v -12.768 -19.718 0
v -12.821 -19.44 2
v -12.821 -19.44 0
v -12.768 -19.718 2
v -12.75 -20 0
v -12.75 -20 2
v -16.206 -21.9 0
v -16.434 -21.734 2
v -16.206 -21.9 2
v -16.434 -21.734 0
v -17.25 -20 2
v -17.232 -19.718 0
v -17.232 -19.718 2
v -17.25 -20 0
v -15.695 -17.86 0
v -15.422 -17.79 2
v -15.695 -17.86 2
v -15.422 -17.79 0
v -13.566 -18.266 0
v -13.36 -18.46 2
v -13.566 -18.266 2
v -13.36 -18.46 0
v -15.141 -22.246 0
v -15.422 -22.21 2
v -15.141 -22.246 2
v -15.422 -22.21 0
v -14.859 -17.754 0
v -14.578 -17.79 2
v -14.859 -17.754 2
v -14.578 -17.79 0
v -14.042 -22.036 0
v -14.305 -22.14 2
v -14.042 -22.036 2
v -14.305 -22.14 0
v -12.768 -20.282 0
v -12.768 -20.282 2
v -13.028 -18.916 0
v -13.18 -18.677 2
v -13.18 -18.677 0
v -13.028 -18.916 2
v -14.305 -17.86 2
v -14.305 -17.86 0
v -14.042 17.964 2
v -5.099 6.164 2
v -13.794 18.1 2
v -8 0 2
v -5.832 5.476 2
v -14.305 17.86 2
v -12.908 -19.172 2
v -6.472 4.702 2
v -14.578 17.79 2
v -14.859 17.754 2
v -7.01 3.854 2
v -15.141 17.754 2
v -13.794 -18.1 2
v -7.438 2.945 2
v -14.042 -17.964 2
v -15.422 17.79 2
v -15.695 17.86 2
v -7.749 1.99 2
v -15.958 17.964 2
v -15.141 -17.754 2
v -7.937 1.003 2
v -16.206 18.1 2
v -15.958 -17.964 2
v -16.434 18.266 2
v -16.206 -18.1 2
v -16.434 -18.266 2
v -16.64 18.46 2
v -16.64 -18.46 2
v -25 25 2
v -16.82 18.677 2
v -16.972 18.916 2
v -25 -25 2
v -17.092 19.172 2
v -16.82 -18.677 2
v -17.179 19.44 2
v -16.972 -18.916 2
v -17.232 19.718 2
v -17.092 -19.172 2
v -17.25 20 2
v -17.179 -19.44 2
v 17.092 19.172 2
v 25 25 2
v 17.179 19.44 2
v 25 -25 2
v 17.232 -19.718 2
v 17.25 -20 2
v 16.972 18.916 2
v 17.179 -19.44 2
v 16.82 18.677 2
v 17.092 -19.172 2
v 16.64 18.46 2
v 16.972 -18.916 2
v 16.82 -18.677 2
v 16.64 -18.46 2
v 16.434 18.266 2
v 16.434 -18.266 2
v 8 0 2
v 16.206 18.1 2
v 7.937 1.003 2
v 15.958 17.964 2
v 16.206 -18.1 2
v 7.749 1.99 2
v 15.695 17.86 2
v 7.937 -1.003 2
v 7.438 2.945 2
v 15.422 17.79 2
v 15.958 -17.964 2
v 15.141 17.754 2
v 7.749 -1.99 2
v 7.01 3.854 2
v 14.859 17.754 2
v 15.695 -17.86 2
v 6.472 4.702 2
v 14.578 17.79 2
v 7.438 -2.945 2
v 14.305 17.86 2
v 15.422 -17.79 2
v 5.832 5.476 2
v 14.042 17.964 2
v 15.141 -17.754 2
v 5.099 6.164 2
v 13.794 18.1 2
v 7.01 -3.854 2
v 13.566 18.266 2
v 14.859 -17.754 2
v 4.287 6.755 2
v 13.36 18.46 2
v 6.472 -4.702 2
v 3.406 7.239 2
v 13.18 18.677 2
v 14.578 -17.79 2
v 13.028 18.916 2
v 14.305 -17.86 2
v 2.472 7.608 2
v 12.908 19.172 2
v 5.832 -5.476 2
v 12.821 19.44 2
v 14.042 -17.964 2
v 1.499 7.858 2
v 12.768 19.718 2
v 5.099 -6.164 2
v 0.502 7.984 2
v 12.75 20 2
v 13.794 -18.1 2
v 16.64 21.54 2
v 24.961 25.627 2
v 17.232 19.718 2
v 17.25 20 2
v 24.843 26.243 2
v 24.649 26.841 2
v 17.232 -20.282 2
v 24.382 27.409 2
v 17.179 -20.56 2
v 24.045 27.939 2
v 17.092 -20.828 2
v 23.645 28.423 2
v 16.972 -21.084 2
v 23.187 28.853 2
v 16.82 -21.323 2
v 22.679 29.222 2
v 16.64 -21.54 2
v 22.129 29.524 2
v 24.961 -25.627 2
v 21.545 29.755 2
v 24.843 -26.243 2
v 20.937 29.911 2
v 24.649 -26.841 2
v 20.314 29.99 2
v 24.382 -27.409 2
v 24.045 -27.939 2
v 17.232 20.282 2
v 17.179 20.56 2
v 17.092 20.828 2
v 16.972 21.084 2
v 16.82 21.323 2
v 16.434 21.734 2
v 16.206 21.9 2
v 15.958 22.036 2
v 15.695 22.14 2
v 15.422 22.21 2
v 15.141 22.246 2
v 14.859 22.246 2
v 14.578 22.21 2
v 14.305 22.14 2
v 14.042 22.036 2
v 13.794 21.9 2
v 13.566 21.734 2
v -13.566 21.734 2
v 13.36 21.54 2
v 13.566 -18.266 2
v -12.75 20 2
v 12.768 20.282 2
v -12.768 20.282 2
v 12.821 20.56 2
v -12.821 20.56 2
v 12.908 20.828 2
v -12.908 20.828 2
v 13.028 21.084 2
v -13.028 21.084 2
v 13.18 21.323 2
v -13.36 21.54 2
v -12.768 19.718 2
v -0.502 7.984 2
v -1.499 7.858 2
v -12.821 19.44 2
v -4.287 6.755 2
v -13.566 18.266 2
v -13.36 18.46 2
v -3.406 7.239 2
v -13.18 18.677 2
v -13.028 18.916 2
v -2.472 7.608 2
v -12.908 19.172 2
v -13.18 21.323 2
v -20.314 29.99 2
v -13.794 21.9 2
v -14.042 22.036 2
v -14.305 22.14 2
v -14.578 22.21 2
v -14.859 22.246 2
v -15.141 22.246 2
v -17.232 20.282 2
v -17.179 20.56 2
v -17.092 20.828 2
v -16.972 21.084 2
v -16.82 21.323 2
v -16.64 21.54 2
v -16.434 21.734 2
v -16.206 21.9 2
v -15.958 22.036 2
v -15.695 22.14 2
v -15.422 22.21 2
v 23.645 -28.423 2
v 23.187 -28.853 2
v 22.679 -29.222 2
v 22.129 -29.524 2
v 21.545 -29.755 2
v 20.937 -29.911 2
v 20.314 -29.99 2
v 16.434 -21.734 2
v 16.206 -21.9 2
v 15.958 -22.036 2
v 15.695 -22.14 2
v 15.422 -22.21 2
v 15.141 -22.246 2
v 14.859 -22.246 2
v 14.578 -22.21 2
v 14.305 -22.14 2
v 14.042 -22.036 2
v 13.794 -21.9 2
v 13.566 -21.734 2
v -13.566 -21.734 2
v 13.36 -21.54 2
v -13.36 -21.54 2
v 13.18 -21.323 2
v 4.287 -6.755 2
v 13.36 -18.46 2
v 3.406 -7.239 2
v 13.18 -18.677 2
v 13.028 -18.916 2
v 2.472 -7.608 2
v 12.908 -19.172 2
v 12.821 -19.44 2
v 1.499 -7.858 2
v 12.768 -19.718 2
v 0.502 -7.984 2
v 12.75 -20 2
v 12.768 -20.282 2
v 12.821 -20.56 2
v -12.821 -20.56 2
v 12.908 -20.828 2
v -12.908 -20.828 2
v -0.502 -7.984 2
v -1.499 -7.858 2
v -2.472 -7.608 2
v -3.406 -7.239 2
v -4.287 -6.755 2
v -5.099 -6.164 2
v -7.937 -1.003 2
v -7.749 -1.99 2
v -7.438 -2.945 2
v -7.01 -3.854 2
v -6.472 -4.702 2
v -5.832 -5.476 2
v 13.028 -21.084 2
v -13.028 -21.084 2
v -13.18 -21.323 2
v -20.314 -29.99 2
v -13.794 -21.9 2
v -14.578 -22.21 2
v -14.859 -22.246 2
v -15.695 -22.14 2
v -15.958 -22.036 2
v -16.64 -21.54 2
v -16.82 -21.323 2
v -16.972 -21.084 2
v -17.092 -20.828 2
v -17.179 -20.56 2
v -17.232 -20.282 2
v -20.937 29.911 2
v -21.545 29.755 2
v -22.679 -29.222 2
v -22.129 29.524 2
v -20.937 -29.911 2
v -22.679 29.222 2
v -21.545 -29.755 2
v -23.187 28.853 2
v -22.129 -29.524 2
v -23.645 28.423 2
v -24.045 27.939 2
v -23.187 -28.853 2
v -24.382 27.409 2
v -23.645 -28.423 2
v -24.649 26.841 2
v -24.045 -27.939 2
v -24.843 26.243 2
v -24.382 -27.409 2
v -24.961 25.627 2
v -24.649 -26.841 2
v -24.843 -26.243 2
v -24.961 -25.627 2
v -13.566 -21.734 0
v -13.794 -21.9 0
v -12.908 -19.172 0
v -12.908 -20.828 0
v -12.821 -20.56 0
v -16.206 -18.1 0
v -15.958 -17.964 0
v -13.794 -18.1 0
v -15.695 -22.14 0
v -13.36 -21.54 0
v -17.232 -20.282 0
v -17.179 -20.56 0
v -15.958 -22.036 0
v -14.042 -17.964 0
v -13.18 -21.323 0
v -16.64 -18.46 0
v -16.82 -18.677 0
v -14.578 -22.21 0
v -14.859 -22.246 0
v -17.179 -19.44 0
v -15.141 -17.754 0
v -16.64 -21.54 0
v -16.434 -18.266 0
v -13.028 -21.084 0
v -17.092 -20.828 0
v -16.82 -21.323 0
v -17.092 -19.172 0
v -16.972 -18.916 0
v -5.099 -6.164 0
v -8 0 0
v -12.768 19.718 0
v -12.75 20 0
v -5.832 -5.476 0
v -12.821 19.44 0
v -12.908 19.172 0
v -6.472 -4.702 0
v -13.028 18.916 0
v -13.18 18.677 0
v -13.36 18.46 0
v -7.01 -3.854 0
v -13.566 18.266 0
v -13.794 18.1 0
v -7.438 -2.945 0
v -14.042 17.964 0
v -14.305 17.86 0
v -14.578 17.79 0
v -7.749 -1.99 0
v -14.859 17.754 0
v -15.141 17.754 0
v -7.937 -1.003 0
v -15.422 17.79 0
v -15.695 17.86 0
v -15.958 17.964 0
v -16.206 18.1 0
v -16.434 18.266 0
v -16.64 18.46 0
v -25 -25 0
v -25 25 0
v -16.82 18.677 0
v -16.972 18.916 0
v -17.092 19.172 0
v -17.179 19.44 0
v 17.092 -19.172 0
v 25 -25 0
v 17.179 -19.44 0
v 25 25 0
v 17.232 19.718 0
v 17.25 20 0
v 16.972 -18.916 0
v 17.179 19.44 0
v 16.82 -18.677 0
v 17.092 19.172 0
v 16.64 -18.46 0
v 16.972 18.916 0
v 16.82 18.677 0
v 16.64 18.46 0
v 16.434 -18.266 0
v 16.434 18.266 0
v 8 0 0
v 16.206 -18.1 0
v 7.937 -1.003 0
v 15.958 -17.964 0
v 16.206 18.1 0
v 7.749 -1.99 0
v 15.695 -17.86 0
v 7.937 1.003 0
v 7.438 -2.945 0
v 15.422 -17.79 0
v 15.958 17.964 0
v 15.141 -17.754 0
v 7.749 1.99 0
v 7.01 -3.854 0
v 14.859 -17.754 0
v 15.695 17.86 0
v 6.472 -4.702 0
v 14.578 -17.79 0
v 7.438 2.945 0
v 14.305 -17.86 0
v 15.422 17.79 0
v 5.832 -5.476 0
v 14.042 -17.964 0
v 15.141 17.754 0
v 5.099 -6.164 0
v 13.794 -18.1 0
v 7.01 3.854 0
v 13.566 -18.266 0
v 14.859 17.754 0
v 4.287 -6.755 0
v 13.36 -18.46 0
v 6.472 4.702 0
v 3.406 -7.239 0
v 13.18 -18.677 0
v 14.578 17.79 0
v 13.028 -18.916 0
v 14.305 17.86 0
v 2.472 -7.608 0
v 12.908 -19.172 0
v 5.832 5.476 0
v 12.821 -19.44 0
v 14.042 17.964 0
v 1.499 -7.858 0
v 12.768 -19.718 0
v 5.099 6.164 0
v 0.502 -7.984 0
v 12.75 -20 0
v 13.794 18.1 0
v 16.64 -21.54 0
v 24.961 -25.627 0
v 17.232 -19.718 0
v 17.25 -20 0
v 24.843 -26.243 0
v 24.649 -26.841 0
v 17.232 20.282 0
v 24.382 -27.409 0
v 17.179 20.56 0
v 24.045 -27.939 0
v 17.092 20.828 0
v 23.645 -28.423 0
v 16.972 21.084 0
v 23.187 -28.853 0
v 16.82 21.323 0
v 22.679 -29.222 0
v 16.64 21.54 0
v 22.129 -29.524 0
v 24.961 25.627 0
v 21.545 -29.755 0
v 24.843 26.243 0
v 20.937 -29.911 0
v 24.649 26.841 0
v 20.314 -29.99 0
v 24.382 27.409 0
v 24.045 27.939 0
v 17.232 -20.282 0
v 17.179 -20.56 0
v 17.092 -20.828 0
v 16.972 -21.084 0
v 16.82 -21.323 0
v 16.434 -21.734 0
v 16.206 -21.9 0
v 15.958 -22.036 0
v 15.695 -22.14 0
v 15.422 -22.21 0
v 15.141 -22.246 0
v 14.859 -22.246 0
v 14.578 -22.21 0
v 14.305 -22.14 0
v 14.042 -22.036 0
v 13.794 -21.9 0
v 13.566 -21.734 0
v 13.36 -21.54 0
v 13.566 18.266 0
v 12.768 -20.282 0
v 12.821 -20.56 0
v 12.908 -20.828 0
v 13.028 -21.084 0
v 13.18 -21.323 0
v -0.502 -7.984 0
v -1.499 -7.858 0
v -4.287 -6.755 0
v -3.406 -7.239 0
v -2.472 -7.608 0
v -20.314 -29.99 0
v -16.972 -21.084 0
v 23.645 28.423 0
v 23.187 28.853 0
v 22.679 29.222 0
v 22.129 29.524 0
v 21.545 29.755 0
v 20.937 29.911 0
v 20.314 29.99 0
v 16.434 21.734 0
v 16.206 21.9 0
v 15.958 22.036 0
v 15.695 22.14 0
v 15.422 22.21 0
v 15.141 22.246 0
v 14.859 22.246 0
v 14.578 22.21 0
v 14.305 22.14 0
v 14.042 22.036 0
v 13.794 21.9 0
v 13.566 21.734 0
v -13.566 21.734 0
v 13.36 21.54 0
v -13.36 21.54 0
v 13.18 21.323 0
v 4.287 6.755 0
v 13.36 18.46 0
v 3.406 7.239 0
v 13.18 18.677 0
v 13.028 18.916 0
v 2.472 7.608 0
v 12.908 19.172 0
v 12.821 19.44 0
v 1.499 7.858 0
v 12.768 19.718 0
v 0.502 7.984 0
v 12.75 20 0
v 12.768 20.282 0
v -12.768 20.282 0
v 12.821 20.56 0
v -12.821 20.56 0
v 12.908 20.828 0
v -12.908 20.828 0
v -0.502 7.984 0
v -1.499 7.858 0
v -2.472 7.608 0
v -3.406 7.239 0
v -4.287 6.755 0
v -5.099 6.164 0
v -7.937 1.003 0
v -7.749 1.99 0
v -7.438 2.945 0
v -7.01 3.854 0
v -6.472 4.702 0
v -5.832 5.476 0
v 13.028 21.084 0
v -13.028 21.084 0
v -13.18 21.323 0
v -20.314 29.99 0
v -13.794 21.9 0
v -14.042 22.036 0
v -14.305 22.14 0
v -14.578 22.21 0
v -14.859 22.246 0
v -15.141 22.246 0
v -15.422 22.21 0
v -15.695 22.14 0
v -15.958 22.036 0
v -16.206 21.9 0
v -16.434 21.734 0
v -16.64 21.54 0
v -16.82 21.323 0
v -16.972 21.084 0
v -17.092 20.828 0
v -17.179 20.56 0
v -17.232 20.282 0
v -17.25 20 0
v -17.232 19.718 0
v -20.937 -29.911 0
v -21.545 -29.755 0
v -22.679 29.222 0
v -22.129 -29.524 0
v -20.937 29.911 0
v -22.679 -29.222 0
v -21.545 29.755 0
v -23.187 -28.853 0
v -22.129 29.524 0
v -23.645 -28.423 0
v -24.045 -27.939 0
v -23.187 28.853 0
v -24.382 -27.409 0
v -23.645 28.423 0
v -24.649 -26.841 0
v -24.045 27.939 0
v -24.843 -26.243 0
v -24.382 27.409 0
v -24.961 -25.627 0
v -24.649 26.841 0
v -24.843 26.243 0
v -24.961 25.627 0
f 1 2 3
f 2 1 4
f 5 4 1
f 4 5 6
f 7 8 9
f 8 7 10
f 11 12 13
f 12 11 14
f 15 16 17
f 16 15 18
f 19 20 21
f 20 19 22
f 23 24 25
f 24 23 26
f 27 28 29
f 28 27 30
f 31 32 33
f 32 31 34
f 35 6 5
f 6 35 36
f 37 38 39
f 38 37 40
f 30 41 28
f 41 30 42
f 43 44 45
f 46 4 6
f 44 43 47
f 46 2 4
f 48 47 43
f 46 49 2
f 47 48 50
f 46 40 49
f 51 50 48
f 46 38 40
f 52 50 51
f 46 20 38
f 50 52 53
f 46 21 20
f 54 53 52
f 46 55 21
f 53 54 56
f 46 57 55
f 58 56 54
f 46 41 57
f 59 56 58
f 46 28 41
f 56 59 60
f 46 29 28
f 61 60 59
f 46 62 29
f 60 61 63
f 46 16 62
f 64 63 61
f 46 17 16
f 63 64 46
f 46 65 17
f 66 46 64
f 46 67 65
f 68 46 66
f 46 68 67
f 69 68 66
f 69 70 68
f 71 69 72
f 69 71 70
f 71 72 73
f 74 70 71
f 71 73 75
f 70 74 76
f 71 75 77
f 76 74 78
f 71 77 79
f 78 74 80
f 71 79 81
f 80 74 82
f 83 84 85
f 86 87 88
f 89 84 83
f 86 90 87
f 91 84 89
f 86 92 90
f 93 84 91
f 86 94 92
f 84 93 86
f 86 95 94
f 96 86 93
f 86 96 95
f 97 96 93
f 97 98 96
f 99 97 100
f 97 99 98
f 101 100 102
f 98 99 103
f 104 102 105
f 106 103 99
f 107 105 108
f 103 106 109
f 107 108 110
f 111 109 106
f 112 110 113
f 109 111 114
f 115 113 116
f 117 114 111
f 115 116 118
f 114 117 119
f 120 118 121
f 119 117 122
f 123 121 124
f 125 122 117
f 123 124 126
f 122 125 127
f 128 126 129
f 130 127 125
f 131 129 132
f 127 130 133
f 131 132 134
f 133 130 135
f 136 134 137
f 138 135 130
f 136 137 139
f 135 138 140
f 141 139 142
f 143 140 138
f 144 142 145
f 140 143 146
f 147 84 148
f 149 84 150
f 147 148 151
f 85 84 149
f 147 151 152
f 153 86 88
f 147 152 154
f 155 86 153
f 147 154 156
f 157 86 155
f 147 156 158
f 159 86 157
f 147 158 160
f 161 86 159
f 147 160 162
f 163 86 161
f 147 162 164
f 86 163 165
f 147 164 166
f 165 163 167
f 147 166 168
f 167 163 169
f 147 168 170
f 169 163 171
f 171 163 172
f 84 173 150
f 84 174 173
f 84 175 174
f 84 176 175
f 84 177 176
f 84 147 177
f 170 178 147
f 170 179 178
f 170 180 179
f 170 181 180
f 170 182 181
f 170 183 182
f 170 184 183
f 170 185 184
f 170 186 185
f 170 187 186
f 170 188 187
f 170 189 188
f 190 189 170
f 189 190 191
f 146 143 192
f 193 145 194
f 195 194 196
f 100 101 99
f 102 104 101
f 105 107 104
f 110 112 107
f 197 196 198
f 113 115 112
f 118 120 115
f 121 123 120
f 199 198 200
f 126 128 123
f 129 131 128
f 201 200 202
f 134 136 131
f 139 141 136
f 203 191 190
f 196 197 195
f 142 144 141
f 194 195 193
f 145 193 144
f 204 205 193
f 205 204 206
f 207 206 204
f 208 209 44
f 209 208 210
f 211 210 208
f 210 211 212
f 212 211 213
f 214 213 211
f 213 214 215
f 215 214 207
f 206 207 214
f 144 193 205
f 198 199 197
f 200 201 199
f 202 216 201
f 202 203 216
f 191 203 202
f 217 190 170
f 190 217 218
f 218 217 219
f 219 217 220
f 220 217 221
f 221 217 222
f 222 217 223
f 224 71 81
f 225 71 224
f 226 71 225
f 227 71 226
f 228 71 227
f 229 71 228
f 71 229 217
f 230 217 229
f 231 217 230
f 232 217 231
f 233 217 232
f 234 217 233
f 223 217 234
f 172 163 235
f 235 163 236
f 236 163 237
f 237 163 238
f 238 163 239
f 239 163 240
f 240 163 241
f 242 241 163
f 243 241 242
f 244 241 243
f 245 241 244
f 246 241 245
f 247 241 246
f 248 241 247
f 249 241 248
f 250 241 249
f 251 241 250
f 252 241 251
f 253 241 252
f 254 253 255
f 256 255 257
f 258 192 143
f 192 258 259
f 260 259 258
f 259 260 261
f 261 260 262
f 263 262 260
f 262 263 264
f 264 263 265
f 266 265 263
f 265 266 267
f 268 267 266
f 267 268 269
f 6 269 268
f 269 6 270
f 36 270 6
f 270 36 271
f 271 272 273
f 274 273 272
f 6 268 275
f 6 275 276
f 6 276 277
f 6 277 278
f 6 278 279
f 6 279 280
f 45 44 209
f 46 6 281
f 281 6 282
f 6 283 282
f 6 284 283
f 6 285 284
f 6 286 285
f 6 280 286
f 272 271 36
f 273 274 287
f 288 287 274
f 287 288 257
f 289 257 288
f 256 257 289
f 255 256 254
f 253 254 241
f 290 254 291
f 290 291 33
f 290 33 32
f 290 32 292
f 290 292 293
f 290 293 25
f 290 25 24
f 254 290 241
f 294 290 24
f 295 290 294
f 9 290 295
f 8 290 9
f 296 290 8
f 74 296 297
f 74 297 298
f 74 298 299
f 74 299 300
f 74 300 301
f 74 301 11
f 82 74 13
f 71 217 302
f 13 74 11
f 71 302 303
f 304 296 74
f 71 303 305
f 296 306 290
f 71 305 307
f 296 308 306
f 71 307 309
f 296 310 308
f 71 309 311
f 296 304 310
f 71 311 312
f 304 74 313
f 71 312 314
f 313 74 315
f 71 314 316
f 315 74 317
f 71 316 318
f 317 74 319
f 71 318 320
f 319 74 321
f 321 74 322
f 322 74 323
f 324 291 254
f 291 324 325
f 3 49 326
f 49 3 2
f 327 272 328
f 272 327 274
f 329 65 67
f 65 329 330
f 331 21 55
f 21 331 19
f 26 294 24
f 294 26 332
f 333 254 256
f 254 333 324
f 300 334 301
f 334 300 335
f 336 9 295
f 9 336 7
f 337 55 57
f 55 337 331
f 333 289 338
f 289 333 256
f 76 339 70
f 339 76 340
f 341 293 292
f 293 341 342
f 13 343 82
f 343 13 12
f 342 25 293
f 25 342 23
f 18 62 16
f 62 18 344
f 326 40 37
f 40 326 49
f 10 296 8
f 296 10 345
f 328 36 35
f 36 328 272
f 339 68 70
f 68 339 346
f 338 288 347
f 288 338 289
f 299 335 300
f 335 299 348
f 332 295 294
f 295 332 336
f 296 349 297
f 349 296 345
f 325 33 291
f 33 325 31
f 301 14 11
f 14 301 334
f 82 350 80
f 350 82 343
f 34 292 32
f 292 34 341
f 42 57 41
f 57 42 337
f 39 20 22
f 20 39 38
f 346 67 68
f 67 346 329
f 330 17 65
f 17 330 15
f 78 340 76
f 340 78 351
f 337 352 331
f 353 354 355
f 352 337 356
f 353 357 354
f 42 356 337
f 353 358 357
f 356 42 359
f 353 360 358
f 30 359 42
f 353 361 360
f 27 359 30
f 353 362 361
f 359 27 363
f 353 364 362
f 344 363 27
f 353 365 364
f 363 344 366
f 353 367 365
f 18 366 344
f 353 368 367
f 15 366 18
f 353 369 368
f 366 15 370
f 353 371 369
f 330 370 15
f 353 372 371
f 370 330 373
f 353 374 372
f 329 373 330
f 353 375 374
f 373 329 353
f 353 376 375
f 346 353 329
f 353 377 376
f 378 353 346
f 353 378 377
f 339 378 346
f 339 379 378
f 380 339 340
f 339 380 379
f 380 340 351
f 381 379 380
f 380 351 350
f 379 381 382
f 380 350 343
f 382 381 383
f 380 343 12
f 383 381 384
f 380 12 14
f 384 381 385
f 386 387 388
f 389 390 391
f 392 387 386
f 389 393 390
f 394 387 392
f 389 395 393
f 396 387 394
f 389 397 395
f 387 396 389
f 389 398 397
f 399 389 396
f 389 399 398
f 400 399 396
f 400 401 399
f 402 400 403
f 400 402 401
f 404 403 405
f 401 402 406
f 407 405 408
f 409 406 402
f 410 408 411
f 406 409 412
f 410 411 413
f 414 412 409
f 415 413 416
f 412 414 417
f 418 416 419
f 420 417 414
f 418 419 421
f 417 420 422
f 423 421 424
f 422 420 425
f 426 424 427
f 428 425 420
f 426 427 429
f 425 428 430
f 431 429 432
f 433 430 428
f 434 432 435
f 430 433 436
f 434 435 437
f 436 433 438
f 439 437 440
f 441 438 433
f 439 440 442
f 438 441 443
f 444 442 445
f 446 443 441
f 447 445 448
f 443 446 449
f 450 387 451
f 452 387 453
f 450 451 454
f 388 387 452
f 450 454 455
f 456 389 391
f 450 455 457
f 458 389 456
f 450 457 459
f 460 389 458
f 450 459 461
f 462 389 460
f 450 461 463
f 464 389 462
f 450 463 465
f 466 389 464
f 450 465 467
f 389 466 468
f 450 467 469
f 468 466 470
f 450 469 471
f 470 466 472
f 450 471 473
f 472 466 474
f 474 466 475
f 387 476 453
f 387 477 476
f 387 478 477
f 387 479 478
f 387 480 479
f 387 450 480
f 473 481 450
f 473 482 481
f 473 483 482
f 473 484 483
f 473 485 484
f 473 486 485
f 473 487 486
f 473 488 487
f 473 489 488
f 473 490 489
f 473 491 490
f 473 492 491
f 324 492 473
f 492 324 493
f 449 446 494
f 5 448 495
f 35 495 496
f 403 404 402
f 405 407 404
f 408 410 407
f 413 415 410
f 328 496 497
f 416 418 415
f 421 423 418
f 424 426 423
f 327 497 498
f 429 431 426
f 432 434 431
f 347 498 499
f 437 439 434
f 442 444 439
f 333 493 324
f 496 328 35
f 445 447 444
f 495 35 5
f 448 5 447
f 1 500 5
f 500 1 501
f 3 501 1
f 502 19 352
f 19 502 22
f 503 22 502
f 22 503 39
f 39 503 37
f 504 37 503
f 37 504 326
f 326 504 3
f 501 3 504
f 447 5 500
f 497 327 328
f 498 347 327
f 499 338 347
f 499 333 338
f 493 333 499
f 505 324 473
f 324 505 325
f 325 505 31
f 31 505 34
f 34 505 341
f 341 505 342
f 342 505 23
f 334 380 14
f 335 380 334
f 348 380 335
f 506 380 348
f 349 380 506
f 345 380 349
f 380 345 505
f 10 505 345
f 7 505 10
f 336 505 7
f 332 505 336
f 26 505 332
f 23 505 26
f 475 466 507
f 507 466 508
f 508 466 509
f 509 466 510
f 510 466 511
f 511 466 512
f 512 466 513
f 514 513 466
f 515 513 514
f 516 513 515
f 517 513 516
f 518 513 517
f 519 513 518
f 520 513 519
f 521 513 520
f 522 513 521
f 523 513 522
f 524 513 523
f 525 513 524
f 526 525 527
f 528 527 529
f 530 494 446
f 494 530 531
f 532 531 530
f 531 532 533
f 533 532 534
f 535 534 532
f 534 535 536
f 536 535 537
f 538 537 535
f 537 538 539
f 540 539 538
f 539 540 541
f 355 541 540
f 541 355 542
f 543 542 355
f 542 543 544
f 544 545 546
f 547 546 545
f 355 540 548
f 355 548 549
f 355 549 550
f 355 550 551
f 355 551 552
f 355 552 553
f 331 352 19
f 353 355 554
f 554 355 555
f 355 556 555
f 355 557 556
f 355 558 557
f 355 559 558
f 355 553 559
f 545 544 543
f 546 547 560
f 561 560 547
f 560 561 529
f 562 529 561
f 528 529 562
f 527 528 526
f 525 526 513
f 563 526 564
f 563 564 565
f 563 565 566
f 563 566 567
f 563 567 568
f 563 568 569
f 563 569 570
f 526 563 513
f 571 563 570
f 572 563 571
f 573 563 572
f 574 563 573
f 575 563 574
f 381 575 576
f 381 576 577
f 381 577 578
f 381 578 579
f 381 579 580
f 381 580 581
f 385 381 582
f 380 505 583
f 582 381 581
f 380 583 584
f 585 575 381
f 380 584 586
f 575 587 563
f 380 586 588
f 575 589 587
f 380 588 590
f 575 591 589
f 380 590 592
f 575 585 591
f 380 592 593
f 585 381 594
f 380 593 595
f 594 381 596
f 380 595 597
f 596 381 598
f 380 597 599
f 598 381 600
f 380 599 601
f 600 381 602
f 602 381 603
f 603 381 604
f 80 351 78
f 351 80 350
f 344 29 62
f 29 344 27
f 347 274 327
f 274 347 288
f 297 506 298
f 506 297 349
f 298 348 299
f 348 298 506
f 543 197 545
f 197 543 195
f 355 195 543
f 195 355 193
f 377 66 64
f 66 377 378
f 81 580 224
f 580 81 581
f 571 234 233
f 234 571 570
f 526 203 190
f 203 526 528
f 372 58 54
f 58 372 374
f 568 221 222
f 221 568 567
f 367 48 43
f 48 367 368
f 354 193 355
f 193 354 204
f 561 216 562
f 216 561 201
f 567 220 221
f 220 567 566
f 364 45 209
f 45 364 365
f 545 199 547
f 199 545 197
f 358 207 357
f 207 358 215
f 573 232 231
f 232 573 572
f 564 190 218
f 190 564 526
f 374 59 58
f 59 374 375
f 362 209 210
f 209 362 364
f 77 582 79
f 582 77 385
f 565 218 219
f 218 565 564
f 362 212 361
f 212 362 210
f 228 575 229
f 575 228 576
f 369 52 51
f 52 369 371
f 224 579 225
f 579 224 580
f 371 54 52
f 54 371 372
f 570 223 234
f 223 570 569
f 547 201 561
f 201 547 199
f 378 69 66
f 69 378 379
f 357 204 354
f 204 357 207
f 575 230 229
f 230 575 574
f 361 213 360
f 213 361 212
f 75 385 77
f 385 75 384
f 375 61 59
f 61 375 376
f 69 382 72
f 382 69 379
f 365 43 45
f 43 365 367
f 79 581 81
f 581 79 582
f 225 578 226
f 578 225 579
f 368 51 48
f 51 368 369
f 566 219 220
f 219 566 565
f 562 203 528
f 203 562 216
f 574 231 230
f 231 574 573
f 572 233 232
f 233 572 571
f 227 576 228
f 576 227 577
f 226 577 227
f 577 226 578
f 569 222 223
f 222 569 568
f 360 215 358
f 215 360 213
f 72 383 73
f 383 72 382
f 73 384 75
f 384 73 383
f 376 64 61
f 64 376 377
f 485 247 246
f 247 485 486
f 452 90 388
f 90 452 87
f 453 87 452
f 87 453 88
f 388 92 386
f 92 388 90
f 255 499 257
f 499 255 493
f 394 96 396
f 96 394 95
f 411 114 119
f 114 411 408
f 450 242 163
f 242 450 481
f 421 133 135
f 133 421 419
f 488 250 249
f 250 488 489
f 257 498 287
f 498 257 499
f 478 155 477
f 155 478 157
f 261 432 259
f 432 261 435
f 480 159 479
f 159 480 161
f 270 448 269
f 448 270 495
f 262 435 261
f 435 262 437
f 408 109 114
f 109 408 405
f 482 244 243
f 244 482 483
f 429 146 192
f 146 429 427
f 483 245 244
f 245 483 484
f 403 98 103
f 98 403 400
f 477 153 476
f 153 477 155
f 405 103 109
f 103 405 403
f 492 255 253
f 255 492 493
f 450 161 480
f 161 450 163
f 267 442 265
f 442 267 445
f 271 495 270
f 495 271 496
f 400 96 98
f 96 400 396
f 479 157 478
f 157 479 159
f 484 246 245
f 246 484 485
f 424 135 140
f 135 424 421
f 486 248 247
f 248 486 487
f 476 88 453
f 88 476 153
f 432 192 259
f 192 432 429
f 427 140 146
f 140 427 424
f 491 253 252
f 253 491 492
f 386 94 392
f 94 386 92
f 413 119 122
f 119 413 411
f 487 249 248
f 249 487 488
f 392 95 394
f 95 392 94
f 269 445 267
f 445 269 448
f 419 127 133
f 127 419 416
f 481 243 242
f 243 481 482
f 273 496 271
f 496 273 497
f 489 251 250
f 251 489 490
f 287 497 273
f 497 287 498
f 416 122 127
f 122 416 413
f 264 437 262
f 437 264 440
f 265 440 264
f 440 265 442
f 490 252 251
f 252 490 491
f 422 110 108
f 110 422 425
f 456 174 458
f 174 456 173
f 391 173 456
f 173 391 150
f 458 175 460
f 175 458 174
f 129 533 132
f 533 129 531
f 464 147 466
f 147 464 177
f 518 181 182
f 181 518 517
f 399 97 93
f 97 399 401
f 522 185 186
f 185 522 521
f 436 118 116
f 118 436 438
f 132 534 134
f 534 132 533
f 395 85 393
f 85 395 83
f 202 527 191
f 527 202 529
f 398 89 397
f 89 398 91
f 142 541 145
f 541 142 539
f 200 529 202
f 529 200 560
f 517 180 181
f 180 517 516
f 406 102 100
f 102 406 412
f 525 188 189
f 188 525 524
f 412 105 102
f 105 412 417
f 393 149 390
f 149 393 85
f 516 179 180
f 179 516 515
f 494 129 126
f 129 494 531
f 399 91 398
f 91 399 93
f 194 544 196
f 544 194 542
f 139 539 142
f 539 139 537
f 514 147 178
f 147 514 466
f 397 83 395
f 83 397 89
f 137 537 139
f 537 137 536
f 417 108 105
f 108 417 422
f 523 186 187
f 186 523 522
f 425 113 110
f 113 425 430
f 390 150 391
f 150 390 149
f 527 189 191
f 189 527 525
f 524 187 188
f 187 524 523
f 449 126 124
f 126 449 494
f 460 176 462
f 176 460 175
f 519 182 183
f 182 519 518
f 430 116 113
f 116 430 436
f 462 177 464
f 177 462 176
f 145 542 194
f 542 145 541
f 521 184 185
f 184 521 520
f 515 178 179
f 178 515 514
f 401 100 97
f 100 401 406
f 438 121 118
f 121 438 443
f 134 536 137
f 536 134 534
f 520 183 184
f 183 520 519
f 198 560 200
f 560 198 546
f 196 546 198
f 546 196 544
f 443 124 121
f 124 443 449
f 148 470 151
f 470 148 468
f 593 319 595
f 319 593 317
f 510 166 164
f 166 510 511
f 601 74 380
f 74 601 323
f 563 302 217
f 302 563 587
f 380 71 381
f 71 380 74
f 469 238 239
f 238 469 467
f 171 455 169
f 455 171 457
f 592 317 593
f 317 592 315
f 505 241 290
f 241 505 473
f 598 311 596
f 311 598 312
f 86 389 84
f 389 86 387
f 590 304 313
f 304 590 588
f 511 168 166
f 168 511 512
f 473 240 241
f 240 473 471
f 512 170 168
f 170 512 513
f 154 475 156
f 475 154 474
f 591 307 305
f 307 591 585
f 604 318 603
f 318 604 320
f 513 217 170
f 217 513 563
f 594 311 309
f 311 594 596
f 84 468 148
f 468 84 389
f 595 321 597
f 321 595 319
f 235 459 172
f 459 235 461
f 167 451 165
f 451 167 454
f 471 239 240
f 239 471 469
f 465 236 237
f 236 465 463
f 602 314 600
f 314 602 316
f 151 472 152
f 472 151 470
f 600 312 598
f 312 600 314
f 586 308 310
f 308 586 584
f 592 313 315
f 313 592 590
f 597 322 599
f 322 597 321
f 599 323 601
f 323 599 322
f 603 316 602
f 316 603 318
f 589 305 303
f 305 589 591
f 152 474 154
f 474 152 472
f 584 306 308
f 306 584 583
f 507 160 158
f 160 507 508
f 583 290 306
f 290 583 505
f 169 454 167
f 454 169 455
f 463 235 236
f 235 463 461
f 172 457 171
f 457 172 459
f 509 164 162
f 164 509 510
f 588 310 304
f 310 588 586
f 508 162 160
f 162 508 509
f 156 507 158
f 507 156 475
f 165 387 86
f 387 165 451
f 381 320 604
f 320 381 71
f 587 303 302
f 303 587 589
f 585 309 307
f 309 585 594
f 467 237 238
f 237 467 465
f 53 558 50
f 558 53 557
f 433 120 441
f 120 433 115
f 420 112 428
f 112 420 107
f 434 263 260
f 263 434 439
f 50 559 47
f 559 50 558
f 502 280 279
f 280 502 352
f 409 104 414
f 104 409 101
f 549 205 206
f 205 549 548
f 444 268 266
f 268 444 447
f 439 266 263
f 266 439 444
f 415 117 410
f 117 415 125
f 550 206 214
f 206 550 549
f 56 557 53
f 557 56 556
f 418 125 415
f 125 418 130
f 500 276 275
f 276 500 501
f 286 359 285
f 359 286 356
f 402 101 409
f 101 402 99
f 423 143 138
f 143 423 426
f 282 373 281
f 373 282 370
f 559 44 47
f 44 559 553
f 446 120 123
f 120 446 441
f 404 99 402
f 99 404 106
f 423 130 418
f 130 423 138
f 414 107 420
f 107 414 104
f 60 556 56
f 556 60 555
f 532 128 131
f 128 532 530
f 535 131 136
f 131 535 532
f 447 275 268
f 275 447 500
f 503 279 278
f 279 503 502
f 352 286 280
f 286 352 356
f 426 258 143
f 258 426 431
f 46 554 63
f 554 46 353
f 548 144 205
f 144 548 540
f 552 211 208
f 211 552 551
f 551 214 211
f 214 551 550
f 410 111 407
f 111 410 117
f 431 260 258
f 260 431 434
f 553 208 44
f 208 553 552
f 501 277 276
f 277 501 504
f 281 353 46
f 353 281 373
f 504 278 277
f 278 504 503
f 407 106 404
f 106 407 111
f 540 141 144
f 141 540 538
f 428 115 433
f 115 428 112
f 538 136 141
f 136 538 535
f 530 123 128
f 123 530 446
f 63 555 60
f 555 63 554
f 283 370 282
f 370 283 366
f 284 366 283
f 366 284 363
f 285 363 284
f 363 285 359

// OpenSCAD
WIDTH = 50;
LENGTH = 60;
CORNER_DIA = 10;
THICKNESS = 2;

HOLE_SPACING_X = 30;
HOLE_SPACING_Y = 40;
HOLE_DIA = 4.5;

BUTTON_HOLE = 16;

$fn = 50;

module holes(width, length, height, dia) {
  for(i = [-1, 1]) {
    for(j = [-1, 1]) {
      translate([i * (width - dia)/2, j * (length - dia)/2, 0])
      cylinder(d = dia, h = height);
    }
  }
}

difference() {
  hull() {
    holes(WIDTH, LENGTH, THICKNESS, CORNER_DIA);
  }
  #holes(HOLE_SPACING_X + HOLE_DIA, HOLE_SPACING_Y + HOLE_DIA, THICKNESS, HOLE_DIA);
  #cylinder(d = BUTTON_HOLE, h = THICKNESS);
}
